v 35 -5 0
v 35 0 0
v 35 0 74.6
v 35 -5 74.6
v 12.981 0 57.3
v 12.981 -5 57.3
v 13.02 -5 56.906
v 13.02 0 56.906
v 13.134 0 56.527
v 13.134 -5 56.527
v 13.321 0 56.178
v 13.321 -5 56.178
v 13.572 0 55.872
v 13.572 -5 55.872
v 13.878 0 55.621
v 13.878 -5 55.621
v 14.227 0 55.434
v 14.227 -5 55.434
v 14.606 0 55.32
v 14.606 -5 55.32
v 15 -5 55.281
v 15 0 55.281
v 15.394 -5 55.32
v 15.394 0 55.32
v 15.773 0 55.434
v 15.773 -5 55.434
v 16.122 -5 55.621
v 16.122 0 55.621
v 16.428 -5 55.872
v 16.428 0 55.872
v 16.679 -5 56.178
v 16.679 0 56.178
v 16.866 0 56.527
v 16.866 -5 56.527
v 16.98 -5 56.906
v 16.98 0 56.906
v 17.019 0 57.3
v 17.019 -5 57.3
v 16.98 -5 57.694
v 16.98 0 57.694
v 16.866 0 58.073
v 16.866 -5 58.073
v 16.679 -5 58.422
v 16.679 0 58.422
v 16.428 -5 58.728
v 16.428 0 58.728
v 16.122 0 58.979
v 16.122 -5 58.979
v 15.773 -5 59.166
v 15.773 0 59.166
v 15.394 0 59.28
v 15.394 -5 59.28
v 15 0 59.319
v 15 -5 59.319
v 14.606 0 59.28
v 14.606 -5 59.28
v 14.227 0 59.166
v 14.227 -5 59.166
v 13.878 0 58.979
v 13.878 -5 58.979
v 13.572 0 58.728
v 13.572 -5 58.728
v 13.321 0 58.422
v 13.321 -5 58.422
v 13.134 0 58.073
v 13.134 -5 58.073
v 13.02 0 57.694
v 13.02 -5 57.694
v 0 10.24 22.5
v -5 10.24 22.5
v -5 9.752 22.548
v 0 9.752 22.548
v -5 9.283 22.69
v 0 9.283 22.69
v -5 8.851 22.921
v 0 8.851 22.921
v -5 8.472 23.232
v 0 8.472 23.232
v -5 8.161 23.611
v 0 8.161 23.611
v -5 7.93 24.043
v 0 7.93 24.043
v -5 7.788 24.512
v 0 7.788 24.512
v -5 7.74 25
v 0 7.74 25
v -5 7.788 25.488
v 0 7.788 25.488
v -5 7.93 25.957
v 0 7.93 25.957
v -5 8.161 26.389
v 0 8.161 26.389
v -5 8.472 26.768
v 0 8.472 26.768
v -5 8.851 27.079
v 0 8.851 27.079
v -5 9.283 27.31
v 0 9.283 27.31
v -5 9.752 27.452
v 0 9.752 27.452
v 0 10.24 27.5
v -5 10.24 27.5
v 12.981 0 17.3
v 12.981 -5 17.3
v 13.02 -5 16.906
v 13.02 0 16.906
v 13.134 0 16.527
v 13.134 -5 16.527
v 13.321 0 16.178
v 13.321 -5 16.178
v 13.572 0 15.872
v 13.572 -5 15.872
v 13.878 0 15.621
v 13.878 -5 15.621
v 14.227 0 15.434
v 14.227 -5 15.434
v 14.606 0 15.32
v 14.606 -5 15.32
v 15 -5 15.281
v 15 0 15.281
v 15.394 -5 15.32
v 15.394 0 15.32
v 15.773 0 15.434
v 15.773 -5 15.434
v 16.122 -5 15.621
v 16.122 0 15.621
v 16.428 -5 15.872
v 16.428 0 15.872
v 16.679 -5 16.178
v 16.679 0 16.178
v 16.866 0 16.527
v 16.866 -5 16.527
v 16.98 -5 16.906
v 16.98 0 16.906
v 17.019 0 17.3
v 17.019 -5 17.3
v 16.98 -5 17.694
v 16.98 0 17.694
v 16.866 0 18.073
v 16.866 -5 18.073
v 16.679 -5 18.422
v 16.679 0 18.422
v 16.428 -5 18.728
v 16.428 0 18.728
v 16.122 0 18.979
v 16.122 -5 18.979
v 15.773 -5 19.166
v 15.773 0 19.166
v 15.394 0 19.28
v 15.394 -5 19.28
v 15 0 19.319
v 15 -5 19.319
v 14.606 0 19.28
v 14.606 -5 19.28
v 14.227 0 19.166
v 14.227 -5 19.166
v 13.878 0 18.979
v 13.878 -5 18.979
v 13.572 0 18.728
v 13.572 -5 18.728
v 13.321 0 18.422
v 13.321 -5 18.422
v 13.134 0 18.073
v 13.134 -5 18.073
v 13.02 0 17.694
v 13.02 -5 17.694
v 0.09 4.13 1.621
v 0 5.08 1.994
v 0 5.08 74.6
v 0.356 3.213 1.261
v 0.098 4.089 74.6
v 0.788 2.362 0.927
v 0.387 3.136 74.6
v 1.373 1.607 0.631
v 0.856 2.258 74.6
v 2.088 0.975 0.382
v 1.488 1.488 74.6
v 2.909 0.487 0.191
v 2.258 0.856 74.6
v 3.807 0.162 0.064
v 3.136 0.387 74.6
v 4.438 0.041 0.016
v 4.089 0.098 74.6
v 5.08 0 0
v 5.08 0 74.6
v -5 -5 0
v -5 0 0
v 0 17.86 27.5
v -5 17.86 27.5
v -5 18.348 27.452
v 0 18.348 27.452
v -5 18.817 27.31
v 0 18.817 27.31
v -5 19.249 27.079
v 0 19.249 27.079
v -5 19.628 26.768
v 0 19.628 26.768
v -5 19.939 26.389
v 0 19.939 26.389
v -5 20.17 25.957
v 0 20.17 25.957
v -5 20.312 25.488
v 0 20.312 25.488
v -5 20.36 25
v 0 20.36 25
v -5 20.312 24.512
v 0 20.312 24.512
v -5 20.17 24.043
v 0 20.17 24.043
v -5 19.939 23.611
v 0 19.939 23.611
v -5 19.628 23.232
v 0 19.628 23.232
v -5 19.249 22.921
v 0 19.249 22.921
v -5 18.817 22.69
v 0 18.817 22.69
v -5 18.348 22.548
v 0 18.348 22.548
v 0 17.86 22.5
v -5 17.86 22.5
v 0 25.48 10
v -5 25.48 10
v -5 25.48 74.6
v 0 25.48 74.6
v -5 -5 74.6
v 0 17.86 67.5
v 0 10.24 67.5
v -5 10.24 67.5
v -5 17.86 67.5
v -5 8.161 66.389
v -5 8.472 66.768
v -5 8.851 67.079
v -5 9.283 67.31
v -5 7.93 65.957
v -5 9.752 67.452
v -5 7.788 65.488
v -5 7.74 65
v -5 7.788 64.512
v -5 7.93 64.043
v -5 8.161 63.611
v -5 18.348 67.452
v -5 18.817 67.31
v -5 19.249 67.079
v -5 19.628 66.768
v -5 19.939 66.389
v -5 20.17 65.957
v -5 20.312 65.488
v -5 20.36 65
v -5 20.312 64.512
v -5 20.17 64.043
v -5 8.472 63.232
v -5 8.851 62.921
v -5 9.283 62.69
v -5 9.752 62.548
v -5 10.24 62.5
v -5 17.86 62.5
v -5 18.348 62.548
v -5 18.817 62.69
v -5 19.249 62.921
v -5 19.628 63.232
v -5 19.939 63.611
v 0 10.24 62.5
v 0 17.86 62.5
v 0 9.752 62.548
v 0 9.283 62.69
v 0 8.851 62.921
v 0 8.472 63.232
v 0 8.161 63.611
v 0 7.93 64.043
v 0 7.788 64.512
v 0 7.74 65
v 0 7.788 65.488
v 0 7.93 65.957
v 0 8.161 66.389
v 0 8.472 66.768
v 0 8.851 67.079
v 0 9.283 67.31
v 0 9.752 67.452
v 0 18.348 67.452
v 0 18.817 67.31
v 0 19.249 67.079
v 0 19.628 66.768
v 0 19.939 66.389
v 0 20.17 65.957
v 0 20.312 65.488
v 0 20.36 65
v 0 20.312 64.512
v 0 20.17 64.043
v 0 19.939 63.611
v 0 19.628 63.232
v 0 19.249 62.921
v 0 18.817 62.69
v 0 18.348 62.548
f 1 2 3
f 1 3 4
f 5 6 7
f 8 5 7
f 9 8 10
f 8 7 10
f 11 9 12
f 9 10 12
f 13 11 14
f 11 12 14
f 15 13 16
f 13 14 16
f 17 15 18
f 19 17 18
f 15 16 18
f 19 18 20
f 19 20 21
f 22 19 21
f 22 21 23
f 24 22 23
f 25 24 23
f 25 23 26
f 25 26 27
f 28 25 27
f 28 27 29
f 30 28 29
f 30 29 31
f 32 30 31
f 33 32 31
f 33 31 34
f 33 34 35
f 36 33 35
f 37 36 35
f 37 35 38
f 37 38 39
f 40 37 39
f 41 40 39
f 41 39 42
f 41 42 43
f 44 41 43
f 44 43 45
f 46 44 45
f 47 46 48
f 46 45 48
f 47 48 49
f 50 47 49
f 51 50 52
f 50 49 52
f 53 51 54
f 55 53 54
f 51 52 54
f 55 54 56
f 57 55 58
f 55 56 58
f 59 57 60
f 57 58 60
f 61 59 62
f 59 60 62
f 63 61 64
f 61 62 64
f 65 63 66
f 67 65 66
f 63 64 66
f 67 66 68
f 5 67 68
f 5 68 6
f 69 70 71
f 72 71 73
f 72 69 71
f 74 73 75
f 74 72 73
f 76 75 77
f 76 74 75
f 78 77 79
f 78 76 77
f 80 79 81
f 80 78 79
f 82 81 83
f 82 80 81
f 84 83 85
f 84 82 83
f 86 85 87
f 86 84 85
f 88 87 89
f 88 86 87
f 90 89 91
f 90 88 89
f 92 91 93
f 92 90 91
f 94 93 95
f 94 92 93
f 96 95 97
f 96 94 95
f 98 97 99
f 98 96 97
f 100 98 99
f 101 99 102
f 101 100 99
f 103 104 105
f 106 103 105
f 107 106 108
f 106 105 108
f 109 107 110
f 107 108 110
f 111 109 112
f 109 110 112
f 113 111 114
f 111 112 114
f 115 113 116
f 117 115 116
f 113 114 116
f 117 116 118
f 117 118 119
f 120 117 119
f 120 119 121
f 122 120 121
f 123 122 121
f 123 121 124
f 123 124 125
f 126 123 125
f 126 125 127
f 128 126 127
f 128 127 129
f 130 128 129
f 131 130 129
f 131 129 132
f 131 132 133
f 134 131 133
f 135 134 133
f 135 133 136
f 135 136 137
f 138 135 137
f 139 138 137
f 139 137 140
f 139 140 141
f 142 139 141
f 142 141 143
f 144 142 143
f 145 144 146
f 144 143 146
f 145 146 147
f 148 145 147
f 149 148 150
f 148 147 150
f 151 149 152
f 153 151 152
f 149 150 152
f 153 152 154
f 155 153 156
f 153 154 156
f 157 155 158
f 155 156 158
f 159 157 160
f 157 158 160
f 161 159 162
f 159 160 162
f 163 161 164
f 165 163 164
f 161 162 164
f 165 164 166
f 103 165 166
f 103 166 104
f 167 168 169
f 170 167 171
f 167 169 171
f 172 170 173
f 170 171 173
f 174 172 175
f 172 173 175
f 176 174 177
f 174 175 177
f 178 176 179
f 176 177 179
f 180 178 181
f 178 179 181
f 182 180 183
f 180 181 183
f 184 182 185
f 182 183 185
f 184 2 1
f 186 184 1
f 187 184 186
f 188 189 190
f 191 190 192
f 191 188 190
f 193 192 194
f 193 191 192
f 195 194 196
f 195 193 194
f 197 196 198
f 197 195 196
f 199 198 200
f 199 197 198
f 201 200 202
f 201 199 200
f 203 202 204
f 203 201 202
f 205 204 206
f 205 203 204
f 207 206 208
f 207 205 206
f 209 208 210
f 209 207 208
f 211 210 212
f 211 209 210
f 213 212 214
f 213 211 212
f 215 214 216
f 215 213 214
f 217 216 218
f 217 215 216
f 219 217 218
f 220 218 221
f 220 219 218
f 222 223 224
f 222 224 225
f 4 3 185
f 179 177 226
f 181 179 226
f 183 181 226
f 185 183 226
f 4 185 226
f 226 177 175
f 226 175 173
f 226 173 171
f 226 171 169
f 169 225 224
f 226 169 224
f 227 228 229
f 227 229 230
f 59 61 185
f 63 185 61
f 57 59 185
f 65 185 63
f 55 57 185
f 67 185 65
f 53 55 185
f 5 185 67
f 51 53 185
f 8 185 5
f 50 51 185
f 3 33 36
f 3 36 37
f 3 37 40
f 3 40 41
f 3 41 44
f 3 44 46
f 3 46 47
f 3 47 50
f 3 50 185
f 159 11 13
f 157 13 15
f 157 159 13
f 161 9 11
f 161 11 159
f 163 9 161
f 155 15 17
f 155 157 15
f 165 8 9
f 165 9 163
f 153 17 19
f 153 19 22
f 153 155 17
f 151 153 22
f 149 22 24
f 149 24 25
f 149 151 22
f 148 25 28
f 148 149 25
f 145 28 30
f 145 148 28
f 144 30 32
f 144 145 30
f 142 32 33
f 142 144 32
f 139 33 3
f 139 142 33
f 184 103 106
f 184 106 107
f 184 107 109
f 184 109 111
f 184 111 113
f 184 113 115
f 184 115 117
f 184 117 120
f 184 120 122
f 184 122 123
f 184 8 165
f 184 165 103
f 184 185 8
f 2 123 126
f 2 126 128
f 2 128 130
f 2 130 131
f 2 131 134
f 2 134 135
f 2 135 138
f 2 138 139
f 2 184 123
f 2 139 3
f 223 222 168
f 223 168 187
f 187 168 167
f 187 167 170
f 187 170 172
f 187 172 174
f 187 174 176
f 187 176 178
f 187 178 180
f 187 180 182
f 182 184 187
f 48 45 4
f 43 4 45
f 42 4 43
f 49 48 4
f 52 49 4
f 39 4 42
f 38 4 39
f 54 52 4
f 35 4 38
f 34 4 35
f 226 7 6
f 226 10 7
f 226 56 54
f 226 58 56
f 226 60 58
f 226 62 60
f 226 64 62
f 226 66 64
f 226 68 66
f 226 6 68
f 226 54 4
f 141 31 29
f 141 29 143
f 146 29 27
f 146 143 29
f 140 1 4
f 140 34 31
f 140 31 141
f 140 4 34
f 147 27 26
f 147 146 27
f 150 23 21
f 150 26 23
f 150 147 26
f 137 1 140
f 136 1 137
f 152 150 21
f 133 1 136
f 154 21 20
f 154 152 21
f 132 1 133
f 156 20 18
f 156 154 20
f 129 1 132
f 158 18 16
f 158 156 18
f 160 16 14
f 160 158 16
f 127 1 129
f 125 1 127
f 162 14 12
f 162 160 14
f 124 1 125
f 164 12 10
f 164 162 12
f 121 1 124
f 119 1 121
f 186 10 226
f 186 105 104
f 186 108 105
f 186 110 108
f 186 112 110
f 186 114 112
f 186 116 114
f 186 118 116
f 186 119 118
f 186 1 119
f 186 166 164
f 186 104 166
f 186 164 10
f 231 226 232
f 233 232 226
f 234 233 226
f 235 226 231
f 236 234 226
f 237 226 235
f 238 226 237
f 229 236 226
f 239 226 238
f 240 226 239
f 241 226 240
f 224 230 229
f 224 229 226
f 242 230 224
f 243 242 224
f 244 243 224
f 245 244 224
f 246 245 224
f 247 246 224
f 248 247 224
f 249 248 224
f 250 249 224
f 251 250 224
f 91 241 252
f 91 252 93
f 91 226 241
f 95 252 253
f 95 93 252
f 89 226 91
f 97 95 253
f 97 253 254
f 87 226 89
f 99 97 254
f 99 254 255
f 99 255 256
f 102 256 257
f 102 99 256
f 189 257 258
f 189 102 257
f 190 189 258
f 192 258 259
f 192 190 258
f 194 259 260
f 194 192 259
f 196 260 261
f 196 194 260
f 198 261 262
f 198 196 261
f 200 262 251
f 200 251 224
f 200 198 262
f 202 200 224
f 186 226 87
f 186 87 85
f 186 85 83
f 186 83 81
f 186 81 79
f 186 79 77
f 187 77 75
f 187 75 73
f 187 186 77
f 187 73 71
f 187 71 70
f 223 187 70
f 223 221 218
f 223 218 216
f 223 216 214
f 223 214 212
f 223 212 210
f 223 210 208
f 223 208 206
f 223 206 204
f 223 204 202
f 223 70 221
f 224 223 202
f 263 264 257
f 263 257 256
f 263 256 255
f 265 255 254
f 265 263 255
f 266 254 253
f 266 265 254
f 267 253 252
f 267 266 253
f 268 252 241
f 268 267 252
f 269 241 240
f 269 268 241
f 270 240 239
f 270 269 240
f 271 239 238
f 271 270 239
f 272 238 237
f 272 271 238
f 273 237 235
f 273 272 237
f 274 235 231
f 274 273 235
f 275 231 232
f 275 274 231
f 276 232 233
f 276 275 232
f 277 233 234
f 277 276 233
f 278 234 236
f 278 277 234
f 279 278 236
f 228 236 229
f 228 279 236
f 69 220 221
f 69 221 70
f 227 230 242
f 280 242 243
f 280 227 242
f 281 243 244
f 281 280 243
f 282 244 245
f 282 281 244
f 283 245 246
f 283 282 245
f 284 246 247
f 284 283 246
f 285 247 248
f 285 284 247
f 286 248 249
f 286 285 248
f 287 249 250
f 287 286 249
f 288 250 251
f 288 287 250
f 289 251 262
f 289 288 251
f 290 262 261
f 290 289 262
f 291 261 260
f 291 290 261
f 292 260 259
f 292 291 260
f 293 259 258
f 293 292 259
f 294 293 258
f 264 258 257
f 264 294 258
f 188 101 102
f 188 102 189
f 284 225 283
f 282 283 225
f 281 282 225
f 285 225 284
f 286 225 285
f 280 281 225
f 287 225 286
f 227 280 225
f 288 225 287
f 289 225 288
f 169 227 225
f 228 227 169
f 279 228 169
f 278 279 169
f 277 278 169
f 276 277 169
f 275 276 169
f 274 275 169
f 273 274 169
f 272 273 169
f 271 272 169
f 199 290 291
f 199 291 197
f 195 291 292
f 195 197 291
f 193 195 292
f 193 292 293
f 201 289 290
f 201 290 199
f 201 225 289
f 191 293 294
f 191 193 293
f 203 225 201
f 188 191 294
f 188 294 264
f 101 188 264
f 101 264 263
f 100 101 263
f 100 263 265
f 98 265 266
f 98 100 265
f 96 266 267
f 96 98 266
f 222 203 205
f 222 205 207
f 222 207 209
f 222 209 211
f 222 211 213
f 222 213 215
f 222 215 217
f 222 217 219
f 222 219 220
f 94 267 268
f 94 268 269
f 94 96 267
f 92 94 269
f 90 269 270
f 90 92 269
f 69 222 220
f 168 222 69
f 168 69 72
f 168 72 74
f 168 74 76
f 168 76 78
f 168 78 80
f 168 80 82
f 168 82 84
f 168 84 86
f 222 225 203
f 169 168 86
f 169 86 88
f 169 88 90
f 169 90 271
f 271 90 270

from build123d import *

# Parameters (mm, degrees)
BOSS_EXTRUDE1_DEPTH    = 74.6
CUT_EXTRUDE2_DEPTH     = 87.251900849
CUT_EXTRUDE3_DEPTH     = 10
FILLET1_R              = 5.08
F_10_32_TAPPED_HOLE1_D = 4.0386


with BuildPart() as part:
    # Sketch1 → Boss-Extrude1 (new body)
    with BuildSketch(Plane.XY):
        Polygon((0, 25.48), (0, 0), (35, 0), (35, -5), (-5, -5), (-5, 25.48), align=None)
    extrude(amount=BOSS_EXTRUDE1_DEPTH)

    # Sketch3 → Cut-Extrude2 (cut, through all)
    with BuildSketch(Plane(origin=(0, 0, 0), x_dir=(0, 0, -1), z_dir=(1, 0, 0))):
        with BuildLine():
            Line((-67.5, 10.24), (-67.5, 17.86))
            ThreePointArc((-67.5, 17.86), (-65, 20.36), (-62.5, 17.86))
            Line((-62.5, 17.86), (-62.5, 10.24))
            ThreePointArc((-62.5, 10.24), (-65, 7.74), (-67.5, 10.24))
        make_face()
        with BuildLine():
            Line((-27.5, 10.24), (-27.5, 17.86))
            ThreePointArc((-27.5, 17.86), (-25, 20.36), (-22.5, 17.86))
            Line((-22.5, 17.86), (-22.5, 10.24))
            ThreePointArc((-22.5, 10.24), (-25, 7.74), (-27.5, 10.24))
        make_face()
    extrude(amount=-CUT_EXTRUDE2_DEPTH, mode=Mode.SUBTRACT)

    # Sketch4 → Cut-Extrude3 (cut)
    with BuildSketch(Plane(origin=(0, 0, 0), x_dir=(0, 0, -1), z_dir=(1, 0, 0))):
        Polygon((-10, 25.48), (0, 0), (0, 25.48), align=None)
    extrude(amount=-CUT_EXTRUDE3_DEPTH, mode=Mode.SUBTRACT)

    # Fillet1
    fillet1_edges = [part.edges().sort_by_distance(p)[0] for p in [
        (0, 0, 37.3),
    ]]
    fillet(fillet1_edges, radius=FILLET1_R)

    # #10-32 Tapped Hole1 (through all)
    with Locations(Plane(origin=(0, 0, 0), x_dir=(1, 0, 0), z_dir=(0, 1, 0))):
        with Locations((15, -17.3), (15, -57.3)):
            Hole(F_10_32_TAPPED_HOLE1_D / 2)


solid = part.part
